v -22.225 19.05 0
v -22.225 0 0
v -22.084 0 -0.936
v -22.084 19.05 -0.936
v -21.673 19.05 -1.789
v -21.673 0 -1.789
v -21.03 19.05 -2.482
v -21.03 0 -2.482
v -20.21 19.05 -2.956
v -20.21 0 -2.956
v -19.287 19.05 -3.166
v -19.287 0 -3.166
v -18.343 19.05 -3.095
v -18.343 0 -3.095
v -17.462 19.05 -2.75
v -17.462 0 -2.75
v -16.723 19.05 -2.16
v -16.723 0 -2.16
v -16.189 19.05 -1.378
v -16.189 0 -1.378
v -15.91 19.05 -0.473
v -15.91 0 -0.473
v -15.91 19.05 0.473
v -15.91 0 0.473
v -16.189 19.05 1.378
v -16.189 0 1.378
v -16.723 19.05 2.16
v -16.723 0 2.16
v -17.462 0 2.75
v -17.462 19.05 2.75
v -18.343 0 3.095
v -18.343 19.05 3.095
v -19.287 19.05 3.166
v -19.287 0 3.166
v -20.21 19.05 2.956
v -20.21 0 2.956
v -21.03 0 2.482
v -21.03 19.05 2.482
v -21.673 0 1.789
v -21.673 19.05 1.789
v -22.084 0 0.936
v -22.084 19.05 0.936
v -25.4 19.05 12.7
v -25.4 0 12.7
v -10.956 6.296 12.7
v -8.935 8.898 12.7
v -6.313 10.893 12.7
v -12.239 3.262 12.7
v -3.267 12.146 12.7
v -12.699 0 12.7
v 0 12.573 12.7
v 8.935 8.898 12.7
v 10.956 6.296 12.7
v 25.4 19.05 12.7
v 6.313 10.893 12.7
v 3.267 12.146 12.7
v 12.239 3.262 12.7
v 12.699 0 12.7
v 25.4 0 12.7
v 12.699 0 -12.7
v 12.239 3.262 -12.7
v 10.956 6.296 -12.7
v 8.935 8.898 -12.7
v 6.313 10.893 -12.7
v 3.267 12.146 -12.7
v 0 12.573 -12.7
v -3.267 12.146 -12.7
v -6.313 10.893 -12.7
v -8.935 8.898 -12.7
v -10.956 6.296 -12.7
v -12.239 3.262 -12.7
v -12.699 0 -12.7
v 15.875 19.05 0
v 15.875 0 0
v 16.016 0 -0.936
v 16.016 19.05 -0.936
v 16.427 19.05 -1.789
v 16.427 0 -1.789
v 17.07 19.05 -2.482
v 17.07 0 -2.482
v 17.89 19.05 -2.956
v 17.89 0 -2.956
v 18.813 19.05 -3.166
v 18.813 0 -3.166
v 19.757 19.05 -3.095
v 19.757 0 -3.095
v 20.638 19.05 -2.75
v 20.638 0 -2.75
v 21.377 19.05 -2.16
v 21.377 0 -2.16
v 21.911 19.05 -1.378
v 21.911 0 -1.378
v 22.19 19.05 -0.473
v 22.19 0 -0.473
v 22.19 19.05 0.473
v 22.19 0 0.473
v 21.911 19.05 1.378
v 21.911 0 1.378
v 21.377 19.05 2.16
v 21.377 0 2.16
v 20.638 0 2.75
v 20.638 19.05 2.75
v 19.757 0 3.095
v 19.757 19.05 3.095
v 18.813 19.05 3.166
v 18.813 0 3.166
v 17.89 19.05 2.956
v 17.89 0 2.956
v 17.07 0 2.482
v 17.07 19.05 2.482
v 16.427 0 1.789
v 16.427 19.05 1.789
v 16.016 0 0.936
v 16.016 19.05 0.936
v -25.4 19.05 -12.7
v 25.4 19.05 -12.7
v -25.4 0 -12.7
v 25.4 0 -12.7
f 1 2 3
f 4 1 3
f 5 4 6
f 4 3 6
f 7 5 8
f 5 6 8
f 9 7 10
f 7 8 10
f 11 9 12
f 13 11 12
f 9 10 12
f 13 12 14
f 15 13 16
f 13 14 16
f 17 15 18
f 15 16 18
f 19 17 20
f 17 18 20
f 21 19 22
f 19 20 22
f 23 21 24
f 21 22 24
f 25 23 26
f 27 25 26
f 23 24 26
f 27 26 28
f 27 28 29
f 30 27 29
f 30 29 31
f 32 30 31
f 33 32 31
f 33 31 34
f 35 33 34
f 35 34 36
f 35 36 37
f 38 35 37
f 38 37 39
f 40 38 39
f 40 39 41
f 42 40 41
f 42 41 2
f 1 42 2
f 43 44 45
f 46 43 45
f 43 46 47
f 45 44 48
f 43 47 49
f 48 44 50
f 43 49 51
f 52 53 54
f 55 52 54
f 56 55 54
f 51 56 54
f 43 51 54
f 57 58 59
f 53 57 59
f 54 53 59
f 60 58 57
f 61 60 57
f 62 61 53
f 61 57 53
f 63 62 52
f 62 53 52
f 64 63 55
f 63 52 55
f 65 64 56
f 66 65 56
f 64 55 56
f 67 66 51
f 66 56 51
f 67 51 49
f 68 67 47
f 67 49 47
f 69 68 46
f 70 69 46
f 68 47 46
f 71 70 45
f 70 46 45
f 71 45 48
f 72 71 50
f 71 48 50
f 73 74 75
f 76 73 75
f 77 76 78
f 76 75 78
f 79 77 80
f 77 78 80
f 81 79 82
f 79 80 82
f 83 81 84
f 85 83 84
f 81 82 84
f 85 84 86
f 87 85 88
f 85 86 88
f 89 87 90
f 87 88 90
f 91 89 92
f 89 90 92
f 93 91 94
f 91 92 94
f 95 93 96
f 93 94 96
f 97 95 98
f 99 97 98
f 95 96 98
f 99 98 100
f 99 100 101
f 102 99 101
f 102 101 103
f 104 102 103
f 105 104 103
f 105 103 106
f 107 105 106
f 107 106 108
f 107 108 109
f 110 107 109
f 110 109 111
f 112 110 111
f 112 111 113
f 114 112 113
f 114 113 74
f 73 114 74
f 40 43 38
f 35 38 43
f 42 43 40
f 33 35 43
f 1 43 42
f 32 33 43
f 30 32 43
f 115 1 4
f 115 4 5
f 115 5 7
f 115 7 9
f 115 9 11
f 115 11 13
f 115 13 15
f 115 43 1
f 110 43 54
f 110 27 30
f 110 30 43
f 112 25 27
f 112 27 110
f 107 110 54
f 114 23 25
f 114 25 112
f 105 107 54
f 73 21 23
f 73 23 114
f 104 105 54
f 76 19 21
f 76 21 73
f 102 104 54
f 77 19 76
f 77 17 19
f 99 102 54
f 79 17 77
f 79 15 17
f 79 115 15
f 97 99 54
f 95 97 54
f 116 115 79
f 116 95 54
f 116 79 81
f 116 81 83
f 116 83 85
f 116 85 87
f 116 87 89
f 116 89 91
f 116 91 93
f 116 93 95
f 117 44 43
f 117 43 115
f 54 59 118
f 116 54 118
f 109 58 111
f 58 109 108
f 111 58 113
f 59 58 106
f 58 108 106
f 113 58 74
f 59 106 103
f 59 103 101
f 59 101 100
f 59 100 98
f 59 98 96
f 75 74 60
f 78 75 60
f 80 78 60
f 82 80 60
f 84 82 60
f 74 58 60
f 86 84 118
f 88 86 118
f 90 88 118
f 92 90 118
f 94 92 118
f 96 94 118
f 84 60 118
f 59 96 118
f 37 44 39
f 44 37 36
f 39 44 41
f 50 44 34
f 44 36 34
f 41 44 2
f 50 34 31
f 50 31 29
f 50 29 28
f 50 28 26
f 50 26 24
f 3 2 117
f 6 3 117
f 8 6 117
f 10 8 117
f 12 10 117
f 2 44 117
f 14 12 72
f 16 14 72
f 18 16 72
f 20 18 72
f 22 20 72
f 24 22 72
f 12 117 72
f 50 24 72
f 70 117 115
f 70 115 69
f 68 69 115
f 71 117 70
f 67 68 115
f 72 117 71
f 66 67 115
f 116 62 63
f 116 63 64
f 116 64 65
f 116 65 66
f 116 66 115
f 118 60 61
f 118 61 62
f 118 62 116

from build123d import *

# Parameters (mm, degrees)
SKETCH1_W        = 50.8
SKETCH1_H        = 25.4
BLOCK_DEPTH      = 19.05
SKETCH2_R        = 12.7
SHAFTHOLE_DEPTH  = 41.659838908
CLAMPING_HOLES_D = 6.35


with BuildPart() as part:
    # Sketch1 → Block (new body)
    with BuildSketch(Plane(origin=(0, 0, 0), x_dir=(1, 0, 0), z_dir=(0, 1, 0))):
        Rectangle(SKETCH1_W, SKETCH1_H)
    extrude(amount=BLOCK_DEPTH)

    # Sketch2 → ShaftHole (cut, through all)
    with BuildSketch(Plane.XY.offset(12.7)):
        with Locations((0, -0.127)):
            Circle(SKETCH2_R)
    extrude(amount=-SHAFTHOLE_DEPTH, mode=Mode.SUBTRACT)

    # Clamping Holes (through all)
    with Locations(Plane(origin=(0, 19.05, 0), x_dir=(1, 0, 0), z_dir=(0, 1, 0))):
        with Locations((-19.05, 0), (19.05, 0)):
            Hole(CLAMPING_HOLES_D / 2)


solid = part.part
